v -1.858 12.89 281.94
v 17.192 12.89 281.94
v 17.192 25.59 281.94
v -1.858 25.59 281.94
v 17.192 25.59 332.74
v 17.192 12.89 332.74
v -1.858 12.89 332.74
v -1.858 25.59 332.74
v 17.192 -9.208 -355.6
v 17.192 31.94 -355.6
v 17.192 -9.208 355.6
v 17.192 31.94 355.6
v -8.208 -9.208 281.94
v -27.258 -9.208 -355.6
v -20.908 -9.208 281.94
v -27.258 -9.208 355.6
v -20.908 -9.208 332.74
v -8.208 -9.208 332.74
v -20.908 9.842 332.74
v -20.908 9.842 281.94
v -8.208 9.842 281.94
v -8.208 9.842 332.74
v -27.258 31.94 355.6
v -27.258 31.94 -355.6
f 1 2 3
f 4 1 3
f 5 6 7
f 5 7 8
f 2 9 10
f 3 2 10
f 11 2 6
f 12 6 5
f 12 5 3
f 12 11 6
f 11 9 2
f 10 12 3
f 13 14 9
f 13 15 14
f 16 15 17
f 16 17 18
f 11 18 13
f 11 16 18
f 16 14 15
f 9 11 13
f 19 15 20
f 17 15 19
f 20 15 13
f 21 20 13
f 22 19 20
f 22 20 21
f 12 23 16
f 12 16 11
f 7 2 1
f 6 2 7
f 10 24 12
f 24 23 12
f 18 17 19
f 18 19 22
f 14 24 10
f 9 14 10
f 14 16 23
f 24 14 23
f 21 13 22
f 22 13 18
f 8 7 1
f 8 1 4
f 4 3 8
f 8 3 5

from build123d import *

# Parameters (mm, degrees)
F0_W     = 44.45
F0_H     = 41.148
F1_DEPTH = 355.6
F2_W     = 12.7
F2_H     = 50.8
F3_DEPTH = 19.05
F4_W     = 12.7
F4_H     = 50.8
F5_DEPTH = 19.05


with BuildPart() as f1:
    # F0 (on Top) → F1 (new body, symmetric)
    with BuildSketch(Plane.XY):
        with Locations((-5.032887, 11.366384)):
            Rectangle(F0_W, F0_H)
    extrude(amount=F1_DEPTH, both=True)

    # F2 (on face) → F3 (cut)
    with BuildSketch(Plane.XZ.offset(9.207616)):
        with Locations((-14.557887, 307.34)):
            Rectangle(F2_W, F2_H)
    extrude(amount=-F3_DEPTH, mode=Mode.SUBTRACT)

    # F4 (on face) → F5 (cut)
    with BuildSketch(Plane.YZ.offset(17.192113)):
        with Locations((19.240384, 307.34)):
            Rectangle(F4_W, F4_H)
    extrude(amount=-F5_DEPTH, mode=Mode.SUBTRACT)


with BuildPart() as f6_1:
    # F6: copy of F1
    add(f1.part)


with BuildPart() as f8_1:
    # F8: copy of F1
    add(f1.part)


with BuildPart() as f10_1:
    # F10: copy of F1
    add(f1.part)


solid = f1.part
